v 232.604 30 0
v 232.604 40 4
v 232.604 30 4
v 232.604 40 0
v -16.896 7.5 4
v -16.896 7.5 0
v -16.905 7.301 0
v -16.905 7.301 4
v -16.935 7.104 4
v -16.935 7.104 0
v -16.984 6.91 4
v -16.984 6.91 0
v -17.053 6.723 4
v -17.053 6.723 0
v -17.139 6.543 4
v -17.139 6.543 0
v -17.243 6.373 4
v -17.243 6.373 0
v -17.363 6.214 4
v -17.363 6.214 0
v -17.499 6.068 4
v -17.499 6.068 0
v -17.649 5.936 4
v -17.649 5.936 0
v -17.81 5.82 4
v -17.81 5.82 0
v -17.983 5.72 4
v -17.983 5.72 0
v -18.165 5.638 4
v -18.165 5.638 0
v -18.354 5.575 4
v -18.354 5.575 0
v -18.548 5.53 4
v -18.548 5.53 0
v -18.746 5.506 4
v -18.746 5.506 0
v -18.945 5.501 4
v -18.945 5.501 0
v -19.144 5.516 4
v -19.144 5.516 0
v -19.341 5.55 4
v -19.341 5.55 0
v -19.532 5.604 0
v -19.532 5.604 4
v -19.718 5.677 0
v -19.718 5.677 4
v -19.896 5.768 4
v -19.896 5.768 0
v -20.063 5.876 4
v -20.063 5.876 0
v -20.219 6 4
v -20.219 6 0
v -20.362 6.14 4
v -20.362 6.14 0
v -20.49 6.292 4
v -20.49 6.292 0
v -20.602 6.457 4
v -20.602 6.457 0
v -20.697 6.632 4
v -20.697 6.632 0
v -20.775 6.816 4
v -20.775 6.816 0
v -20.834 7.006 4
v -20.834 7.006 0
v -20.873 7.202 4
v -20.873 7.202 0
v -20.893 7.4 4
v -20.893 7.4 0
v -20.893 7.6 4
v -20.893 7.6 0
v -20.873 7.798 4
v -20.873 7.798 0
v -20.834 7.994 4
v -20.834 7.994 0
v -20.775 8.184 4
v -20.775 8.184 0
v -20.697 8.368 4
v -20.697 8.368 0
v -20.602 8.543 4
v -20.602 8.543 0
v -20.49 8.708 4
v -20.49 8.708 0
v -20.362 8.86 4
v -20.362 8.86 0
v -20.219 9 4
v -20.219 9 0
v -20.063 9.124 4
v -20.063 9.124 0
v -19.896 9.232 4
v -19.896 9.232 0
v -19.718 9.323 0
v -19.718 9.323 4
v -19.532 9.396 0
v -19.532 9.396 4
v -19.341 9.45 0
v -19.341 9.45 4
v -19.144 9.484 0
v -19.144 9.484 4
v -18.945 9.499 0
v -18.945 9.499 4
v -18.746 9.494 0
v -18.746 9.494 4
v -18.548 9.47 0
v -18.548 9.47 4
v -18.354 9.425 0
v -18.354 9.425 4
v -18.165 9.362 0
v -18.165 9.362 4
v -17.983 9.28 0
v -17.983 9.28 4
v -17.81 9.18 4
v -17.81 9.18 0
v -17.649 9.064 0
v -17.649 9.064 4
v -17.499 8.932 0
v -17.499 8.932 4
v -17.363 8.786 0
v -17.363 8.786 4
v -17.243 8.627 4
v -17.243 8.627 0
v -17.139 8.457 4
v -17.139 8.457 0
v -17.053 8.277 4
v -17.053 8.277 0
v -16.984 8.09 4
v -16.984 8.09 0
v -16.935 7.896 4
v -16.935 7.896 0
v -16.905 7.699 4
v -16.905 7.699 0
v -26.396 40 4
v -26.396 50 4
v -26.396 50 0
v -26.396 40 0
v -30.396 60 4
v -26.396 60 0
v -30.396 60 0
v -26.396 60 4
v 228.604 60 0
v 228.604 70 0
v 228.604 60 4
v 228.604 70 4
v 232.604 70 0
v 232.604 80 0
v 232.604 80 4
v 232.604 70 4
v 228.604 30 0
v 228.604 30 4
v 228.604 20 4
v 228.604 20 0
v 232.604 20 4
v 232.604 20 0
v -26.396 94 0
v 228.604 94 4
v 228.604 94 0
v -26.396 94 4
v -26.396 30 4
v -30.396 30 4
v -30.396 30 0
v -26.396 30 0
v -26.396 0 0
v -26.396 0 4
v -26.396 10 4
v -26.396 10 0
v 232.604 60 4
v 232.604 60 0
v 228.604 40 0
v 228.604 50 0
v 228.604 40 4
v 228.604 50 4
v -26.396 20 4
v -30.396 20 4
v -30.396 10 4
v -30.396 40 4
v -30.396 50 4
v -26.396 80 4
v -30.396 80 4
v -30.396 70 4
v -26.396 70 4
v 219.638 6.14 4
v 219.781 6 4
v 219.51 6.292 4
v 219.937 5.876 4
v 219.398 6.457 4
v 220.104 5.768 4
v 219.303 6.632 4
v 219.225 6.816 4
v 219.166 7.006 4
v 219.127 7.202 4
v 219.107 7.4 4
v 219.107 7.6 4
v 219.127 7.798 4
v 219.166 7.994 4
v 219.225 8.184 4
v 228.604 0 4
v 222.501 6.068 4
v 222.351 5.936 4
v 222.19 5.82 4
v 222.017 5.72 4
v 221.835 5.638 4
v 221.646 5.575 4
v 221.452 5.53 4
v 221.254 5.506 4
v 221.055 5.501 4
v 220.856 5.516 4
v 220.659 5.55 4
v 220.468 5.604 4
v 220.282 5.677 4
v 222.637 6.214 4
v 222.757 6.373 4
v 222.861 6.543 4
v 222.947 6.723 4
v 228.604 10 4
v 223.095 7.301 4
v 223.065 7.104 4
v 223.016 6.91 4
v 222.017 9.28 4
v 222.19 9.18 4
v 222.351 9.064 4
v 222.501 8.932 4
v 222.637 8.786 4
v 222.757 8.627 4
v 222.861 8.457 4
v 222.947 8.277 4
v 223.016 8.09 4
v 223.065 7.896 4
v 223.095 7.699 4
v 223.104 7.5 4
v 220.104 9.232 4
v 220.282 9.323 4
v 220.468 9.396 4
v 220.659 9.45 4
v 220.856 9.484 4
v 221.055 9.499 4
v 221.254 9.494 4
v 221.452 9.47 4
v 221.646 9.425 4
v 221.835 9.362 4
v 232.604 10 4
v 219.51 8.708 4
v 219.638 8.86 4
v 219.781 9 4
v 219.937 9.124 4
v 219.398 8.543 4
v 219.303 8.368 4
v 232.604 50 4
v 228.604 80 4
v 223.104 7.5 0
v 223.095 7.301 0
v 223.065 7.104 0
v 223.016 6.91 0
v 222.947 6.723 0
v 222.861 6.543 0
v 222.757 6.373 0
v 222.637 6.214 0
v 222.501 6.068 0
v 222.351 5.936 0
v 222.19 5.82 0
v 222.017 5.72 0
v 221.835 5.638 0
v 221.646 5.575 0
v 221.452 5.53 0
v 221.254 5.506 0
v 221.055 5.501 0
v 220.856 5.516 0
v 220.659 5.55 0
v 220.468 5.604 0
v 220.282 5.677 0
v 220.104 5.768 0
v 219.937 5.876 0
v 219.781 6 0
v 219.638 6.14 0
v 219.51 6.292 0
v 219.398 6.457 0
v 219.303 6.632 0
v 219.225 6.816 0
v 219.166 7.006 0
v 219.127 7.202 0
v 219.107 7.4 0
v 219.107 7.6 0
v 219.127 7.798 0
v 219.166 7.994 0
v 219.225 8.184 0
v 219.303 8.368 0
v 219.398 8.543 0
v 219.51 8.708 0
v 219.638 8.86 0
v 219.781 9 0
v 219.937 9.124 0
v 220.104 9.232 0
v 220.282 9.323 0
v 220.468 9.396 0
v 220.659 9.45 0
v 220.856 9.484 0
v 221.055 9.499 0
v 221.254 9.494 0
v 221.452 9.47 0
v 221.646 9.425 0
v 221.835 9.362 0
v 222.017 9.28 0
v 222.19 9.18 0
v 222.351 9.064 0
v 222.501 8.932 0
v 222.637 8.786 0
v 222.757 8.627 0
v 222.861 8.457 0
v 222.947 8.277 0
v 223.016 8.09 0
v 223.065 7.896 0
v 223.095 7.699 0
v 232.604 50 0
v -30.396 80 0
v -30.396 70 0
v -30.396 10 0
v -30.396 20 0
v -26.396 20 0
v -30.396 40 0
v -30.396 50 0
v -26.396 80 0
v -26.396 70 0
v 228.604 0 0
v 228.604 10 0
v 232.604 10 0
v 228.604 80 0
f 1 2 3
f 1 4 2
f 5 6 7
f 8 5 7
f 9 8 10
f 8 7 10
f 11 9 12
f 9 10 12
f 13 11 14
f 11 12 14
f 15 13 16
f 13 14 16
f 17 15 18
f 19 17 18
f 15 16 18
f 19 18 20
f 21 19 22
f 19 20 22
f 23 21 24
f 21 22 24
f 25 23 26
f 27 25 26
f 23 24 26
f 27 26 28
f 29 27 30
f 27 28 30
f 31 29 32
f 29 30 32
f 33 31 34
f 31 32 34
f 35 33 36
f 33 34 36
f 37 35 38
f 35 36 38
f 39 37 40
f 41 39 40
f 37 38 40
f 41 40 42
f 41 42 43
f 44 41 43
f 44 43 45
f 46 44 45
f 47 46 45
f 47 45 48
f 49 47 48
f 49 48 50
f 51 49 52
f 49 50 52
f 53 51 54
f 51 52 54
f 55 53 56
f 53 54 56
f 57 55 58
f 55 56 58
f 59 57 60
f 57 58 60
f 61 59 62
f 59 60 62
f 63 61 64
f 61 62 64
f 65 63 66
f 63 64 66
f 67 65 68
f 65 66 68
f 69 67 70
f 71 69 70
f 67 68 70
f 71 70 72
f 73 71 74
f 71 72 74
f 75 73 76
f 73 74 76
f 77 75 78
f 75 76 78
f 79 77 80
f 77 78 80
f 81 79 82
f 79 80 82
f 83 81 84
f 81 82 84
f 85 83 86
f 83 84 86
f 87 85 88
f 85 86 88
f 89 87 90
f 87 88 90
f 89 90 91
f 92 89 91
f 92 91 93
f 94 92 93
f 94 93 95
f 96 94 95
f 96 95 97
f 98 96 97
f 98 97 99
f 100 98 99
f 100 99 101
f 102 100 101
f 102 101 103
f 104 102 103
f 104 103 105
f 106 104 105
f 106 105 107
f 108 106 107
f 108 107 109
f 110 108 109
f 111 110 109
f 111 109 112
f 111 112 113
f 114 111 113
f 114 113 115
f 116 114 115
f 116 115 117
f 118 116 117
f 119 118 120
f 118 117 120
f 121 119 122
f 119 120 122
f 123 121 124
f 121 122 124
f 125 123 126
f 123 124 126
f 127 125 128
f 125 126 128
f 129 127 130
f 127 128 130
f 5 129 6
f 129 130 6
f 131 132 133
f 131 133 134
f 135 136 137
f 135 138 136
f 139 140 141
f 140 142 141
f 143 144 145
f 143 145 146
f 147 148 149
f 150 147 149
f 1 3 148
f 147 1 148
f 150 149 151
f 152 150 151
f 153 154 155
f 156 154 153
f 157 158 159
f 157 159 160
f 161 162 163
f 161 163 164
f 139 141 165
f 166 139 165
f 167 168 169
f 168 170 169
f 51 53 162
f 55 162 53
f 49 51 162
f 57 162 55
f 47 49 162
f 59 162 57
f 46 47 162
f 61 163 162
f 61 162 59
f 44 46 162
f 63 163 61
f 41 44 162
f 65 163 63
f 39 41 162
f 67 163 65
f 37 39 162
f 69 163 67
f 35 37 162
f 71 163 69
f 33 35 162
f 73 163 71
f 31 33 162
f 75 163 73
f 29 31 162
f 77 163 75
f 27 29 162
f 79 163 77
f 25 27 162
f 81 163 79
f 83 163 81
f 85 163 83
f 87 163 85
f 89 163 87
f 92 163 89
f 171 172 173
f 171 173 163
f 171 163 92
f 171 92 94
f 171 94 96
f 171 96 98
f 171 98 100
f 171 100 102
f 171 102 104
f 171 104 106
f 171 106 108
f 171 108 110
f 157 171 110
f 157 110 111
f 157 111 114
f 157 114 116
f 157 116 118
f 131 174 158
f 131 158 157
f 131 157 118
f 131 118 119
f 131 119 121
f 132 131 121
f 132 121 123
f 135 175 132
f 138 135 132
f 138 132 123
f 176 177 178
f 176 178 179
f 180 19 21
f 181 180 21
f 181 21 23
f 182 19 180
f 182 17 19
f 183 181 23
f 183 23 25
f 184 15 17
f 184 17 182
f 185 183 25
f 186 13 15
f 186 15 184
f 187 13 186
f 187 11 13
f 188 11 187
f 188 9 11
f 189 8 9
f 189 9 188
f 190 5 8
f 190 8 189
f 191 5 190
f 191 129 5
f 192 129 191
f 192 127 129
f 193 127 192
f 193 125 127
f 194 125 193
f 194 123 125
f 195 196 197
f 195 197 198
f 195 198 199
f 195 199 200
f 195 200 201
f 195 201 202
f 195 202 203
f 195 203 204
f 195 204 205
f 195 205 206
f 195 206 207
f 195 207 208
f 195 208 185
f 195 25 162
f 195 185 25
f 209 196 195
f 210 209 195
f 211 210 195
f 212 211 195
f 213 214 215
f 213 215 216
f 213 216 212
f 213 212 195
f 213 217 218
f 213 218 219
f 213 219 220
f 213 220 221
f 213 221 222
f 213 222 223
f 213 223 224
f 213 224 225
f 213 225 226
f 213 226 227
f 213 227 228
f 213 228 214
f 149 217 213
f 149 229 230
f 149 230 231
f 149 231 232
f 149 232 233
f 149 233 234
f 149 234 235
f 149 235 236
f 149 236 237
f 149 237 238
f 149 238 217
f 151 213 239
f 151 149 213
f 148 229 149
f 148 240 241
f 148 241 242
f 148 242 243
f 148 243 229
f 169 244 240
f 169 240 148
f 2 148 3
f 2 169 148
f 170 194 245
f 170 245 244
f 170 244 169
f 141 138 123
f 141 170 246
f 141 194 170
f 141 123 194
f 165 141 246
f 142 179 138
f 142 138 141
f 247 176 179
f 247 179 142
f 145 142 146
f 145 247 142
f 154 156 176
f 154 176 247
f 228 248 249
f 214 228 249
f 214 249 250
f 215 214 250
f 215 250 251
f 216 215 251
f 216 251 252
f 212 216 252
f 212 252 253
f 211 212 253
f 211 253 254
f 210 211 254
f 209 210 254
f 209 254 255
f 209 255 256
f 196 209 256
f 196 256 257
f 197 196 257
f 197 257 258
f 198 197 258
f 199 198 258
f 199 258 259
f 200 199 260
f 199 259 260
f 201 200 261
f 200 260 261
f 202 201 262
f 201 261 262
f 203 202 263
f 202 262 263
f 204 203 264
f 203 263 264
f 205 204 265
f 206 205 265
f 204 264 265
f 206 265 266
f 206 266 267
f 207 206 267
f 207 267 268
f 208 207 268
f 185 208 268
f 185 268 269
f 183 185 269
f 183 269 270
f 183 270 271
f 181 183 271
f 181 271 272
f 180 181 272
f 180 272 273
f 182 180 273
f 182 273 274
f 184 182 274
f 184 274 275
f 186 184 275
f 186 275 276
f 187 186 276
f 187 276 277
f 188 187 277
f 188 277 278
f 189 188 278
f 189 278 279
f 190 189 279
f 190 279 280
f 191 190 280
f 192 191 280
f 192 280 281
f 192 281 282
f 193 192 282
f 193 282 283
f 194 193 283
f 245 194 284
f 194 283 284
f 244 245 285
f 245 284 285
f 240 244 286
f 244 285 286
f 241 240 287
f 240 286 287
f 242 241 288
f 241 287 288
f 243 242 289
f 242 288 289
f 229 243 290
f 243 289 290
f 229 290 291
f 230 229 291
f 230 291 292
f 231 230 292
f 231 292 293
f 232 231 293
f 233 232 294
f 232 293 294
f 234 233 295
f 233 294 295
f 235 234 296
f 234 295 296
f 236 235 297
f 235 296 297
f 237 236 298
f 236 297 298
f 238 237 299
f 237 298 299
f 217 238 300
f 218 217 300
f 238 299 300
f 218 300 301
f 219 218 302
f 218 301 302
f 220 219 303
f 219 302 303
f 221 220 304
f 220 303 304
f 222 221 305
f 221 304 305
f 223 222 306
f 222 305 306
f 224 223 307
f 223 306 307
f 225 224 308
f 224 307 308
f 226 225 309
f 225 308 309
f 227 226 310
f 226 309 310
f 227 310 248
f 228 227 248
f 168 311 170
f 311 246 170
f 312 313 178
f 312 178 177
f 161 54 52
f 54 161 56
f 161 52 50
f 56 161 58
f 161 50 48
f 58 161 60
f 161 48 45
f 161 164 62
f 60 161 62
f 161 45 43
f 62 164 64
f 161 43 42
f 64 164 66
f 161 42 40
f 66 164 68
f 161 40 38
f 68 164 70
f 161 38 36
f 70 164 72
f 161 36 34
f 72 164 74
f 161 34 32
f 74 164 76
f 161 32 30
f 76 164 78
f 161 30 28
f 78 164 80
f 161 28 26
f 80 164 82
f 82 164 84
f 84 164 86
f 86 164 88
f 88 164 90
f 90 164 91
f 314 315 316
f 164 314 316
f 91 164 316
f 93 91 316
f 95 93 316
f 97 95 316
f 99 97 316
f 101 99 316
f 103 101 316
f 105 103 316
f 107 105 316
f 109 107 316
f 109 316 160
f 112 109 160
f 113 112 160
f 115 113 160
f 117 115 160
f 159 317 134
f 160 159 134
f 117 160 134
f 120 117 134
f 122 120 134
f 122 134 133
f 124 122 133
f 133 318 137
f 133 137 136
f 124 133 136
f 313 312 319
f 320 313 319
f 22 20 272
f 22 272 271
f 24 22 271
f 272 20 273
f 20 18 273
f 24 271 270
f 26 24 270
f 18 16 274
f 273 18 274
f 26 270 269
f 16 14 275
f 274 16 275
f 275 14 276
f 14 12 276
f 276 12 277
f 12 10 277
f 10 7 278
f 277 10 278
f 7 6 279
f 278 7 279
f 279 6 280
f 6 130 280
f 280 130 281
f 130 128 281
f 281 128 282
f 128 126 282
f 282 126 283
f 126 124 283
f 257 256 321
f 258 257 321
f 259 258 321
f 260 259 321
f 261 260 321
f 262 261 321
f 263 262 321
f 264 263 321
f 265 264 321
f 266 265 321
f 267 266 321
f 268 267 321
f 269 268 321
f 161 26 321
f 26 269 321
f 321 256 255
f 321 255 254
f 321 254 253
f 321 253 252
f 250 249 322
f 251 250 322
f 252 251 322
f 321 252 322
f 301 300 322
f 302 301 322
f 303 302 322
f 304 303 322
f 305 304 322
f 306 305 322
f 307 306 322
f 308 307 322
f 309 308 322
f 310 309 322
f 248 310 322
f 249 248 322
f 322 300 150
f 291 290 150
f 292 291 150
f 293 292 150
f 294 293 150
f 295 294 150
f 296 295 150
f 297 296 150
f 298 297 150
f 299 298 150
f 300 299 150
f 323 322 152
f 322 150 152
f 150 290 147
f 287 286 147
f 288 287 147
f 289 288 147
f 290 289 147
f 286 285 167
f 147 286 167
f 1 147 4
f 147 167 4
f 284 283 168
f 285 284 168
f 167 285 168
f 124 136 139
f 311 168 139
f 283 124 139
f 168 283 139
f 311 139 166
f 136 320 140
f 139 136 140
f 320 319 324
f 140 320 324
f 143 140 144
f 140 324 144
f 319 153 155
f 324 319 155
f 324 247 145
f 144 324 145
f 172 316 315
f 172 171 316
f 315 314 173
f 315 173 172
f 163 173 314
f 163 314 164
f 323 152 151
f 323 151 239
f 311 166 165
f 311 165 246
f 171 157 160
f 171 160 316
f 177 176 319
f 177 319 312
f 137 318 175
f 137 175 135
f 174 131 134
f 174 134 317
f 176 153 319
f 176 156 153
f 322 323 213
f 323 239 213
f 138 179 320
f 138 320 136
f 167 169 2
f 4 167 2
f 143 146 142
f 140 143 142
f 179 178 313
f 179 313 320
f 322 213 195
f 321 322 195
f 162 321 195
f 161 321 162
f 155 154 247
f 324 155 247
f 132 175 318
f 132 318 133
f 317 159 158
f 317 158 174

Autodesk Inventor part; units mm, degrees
ref_plane "YZ Plane" through (0, 0, 0) normal (1, 0, 0) x (0, 1, 0)
ref_plane "XZ Plane" through (0, 0, 0) normal (0, 1, 0) x (-1, 0, 0)
ref_plane "XY Plane" through (0, 0, 0) normal (0, 0, 1) x (1, 0, 0)
sketch "Эскиз1" plane through (0, 0, 0) normal (0, 0, 1) x (1, 0, 0)
  line L0 (-26.3955, 0) -> (-26.3955, 30) projected
  line L1 (228.6045, 0) -> (228.6045, 30)
  circle A0 centre (221.1045, 7.5) radius 2
  circle A1 centre (-18.8955, 7.5) radius 2 projected
  line L2 (-26.3955, 60.0004) -> (-30.3955, 60.0004) projected
  line L3 (-26.3955, 60.0004) -> (228.6045, 60.0004)
  line L4 (228.6045, 60.0004) -> (228.6045, 0)
  line L5 (228.6045, 0) -> (-26.3955, 0)
  line L6 (-26.3955, 0) -> (-26.3955, 60.0004)
  point P0 (0, 0)
  dimension "d34" = 7.5
  dimension "d35" = 7.5
  dimension "d36" = 255
extrude "Выдавливание1" add sketch "Эскиз1" along normal blind 4
thicken "Толщина1" operation add thickness 4 both sides no extend neighbours yes toward (1, 0, 0) faces at (228.6045, 10, 1.3333)
thicken "Толщина2" operation add thickness 4 both sides no extend neighbours yes toward (-1, 0, 0) faces at (-26.3955, 40.0003, 2.6667)
sketch "Эскиз2" plane through (0, 0, 4) normal (0, 0, 1) x (1, 0, 0)
  line L0 (232.6045, 60.0004) -> (-30.3955, 60.0004) projected
  line L1 (-30.3955, 60.0004) -> (232.6045, 60.0004)
  line L2 (232.6045, 60.0004) -> (232.6045, 90.0004)
  line L3 (232.6045, 90.0004) -> (-30.3955, 90.0004)
  line L4 (-30.3955, 90.0004) -> (-30.3955, 60.0004)
  point P0 (0, 0)
  dimension "d6" = 30
  dimension "d37" = 263
extrude "Выдавливание2" add sketch "Эскиз2" against normal blind 4
sketch "Эскиз3" plane through (0, 0, 4) normal (0, 0, 1) x (1, 0, 0)
  line L0 (-30.3955, 90.0004) -> (-30.3955, 0) projected
  line L1 (-30.3955, 90.0004) -> (-26.3955, 90.0004)
  line L2 (-26.3955, 90.0004) -> (-26.3955, 80.0004)
  line L3 (-26.3955, 80.0004) -> (-30.3955, 80.0004)
  line L4 (-30.3955, 80.0004) -> (-30.3955, 90.0004)
  point P0 (0, 0)
  dimension "d9" = 4
  dimension "d10" = 10
extrude "Выдавливание3" cut sketch "Эскиз3" against normal blind 4
pattern_linear "Прямоуг.массив1" count 5 spacing 20 along (0, -1, 0) of "Выдавливание3"
thicken "Толщина3" operation add thickness 1 both sides no extend neighbours yes toward (1, 0, 0) faces at (-30.3955, 0.0003, 1.3333) (-29.0622, 0.0004, 2.6667)
sketch "Эскиз4" plane through (0, 0, 4) normal (0, 0, 1) x (1, 0, 0)
  line L0 (232.6045, 90.0004) -> (228.6045, 90.0004)
  line L1 (228.6045, 90.0004) -> (228.6045, 80.0004)
  line L2 (228.6045, 80.0004) -> (232.6045, 80.0004)
  line L3 (232.6045, 80.0004) -> (232.6045, 90.0004)
  point P0 (0, 0)
  dimension "d18" = 4
  dimension "d19" = 10
extrude "Выдавливание4" cut sketch "Эскиз4" against normal blind 4
pattern_linear "Прямоуг.массив2" count 5 spacing 20 along (0, -1, 0) of "Выдавливание4"
thicken "Толщина4" operation add thickness 1 both sides no extend neighbours yes toward (-1, 0, 0) faces at (232.6045, 0.0001, 1.3333) (229.9378, 0.0004, 2.6667)
sketch "Эскиз5" plane through (0, 0, 4) normal (0, 0, 1) x (1, 0, 0)
  line L0 (-26.3955, 90.0004) -> (228.6045, 90.0004) projected
  line L1 (-26.3955, 90.0004) -> (-21.3955, 90.0004)
  line L2 (-21.3955, 90.0004) -> (-21.3955, 94.0004)
  line L3 (-21.3955, 94.0004) -> (-26.3955, 94.0004)
  line L4 (-26.3955, 94.0004) -> (-26.3955, 90.0004)
  point P0 (0, 0)
  dimension "d27" = 5
  dimension "d28" = 4
extrude "Выдавливание5" add sketch "Эскиз5" against normal blind 4
pattern_linear "Прямоуг.массив3" count 51 spacing 5 along (1, 0, 0) of "Выдавливание5"
properties part number "KB33-046-004-014 - Лицевая вертикальня пластина" material "Пластик АБС"
